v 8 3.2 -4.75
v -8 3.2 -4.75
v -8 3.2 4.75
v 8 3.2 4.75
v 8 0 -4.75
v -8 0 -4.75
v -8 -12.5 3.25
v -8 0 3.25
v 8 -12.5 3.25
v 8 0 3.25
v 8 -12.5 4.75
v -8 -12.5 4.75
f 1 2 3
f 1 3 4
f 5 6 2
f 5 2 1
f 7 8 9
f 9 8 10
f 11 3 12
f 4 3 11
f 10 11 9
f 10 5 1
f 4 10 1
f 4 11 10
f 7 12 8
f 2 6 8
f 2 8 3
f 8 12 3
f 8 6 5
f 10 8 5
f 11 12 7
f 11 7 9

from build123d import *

# Parameters (mm, degrees)
SKETCH1_W           = 16
SKETCH1_H           = 9.5
BOSS_EXTRUDE1_DEPTH = 3.2
SKETCH2_W           = 16
SKETCH2_H           = 12.5
BOSS_EXTRUDE2_DEPTH = 1.5


with BuildPart() as part:
    # Sketch1 → Boss-Extrude1 (new body)
    with BuildSketch(Plane(origin=(0, 0, 0), x_dir=(1, 0, 0), z_dir=(0, 1, 0))):
        Rectangle(SKETCH1_W, SKETCH1_H)
    extrude(amount=BOSS_EXTRUDE1_DEPTH)

    # Sketch2 → Boss-Extrude2 (add)
    with BuildSketch(Plane.XY.offset(4.75)):
        with Locations((0, -6.25)):
            Rectangle(SKETCH2_W, SKETCH2_H)
    extrude(amount=-BOSS_EXTRUDE2_DEPTH)


solid = part.part
